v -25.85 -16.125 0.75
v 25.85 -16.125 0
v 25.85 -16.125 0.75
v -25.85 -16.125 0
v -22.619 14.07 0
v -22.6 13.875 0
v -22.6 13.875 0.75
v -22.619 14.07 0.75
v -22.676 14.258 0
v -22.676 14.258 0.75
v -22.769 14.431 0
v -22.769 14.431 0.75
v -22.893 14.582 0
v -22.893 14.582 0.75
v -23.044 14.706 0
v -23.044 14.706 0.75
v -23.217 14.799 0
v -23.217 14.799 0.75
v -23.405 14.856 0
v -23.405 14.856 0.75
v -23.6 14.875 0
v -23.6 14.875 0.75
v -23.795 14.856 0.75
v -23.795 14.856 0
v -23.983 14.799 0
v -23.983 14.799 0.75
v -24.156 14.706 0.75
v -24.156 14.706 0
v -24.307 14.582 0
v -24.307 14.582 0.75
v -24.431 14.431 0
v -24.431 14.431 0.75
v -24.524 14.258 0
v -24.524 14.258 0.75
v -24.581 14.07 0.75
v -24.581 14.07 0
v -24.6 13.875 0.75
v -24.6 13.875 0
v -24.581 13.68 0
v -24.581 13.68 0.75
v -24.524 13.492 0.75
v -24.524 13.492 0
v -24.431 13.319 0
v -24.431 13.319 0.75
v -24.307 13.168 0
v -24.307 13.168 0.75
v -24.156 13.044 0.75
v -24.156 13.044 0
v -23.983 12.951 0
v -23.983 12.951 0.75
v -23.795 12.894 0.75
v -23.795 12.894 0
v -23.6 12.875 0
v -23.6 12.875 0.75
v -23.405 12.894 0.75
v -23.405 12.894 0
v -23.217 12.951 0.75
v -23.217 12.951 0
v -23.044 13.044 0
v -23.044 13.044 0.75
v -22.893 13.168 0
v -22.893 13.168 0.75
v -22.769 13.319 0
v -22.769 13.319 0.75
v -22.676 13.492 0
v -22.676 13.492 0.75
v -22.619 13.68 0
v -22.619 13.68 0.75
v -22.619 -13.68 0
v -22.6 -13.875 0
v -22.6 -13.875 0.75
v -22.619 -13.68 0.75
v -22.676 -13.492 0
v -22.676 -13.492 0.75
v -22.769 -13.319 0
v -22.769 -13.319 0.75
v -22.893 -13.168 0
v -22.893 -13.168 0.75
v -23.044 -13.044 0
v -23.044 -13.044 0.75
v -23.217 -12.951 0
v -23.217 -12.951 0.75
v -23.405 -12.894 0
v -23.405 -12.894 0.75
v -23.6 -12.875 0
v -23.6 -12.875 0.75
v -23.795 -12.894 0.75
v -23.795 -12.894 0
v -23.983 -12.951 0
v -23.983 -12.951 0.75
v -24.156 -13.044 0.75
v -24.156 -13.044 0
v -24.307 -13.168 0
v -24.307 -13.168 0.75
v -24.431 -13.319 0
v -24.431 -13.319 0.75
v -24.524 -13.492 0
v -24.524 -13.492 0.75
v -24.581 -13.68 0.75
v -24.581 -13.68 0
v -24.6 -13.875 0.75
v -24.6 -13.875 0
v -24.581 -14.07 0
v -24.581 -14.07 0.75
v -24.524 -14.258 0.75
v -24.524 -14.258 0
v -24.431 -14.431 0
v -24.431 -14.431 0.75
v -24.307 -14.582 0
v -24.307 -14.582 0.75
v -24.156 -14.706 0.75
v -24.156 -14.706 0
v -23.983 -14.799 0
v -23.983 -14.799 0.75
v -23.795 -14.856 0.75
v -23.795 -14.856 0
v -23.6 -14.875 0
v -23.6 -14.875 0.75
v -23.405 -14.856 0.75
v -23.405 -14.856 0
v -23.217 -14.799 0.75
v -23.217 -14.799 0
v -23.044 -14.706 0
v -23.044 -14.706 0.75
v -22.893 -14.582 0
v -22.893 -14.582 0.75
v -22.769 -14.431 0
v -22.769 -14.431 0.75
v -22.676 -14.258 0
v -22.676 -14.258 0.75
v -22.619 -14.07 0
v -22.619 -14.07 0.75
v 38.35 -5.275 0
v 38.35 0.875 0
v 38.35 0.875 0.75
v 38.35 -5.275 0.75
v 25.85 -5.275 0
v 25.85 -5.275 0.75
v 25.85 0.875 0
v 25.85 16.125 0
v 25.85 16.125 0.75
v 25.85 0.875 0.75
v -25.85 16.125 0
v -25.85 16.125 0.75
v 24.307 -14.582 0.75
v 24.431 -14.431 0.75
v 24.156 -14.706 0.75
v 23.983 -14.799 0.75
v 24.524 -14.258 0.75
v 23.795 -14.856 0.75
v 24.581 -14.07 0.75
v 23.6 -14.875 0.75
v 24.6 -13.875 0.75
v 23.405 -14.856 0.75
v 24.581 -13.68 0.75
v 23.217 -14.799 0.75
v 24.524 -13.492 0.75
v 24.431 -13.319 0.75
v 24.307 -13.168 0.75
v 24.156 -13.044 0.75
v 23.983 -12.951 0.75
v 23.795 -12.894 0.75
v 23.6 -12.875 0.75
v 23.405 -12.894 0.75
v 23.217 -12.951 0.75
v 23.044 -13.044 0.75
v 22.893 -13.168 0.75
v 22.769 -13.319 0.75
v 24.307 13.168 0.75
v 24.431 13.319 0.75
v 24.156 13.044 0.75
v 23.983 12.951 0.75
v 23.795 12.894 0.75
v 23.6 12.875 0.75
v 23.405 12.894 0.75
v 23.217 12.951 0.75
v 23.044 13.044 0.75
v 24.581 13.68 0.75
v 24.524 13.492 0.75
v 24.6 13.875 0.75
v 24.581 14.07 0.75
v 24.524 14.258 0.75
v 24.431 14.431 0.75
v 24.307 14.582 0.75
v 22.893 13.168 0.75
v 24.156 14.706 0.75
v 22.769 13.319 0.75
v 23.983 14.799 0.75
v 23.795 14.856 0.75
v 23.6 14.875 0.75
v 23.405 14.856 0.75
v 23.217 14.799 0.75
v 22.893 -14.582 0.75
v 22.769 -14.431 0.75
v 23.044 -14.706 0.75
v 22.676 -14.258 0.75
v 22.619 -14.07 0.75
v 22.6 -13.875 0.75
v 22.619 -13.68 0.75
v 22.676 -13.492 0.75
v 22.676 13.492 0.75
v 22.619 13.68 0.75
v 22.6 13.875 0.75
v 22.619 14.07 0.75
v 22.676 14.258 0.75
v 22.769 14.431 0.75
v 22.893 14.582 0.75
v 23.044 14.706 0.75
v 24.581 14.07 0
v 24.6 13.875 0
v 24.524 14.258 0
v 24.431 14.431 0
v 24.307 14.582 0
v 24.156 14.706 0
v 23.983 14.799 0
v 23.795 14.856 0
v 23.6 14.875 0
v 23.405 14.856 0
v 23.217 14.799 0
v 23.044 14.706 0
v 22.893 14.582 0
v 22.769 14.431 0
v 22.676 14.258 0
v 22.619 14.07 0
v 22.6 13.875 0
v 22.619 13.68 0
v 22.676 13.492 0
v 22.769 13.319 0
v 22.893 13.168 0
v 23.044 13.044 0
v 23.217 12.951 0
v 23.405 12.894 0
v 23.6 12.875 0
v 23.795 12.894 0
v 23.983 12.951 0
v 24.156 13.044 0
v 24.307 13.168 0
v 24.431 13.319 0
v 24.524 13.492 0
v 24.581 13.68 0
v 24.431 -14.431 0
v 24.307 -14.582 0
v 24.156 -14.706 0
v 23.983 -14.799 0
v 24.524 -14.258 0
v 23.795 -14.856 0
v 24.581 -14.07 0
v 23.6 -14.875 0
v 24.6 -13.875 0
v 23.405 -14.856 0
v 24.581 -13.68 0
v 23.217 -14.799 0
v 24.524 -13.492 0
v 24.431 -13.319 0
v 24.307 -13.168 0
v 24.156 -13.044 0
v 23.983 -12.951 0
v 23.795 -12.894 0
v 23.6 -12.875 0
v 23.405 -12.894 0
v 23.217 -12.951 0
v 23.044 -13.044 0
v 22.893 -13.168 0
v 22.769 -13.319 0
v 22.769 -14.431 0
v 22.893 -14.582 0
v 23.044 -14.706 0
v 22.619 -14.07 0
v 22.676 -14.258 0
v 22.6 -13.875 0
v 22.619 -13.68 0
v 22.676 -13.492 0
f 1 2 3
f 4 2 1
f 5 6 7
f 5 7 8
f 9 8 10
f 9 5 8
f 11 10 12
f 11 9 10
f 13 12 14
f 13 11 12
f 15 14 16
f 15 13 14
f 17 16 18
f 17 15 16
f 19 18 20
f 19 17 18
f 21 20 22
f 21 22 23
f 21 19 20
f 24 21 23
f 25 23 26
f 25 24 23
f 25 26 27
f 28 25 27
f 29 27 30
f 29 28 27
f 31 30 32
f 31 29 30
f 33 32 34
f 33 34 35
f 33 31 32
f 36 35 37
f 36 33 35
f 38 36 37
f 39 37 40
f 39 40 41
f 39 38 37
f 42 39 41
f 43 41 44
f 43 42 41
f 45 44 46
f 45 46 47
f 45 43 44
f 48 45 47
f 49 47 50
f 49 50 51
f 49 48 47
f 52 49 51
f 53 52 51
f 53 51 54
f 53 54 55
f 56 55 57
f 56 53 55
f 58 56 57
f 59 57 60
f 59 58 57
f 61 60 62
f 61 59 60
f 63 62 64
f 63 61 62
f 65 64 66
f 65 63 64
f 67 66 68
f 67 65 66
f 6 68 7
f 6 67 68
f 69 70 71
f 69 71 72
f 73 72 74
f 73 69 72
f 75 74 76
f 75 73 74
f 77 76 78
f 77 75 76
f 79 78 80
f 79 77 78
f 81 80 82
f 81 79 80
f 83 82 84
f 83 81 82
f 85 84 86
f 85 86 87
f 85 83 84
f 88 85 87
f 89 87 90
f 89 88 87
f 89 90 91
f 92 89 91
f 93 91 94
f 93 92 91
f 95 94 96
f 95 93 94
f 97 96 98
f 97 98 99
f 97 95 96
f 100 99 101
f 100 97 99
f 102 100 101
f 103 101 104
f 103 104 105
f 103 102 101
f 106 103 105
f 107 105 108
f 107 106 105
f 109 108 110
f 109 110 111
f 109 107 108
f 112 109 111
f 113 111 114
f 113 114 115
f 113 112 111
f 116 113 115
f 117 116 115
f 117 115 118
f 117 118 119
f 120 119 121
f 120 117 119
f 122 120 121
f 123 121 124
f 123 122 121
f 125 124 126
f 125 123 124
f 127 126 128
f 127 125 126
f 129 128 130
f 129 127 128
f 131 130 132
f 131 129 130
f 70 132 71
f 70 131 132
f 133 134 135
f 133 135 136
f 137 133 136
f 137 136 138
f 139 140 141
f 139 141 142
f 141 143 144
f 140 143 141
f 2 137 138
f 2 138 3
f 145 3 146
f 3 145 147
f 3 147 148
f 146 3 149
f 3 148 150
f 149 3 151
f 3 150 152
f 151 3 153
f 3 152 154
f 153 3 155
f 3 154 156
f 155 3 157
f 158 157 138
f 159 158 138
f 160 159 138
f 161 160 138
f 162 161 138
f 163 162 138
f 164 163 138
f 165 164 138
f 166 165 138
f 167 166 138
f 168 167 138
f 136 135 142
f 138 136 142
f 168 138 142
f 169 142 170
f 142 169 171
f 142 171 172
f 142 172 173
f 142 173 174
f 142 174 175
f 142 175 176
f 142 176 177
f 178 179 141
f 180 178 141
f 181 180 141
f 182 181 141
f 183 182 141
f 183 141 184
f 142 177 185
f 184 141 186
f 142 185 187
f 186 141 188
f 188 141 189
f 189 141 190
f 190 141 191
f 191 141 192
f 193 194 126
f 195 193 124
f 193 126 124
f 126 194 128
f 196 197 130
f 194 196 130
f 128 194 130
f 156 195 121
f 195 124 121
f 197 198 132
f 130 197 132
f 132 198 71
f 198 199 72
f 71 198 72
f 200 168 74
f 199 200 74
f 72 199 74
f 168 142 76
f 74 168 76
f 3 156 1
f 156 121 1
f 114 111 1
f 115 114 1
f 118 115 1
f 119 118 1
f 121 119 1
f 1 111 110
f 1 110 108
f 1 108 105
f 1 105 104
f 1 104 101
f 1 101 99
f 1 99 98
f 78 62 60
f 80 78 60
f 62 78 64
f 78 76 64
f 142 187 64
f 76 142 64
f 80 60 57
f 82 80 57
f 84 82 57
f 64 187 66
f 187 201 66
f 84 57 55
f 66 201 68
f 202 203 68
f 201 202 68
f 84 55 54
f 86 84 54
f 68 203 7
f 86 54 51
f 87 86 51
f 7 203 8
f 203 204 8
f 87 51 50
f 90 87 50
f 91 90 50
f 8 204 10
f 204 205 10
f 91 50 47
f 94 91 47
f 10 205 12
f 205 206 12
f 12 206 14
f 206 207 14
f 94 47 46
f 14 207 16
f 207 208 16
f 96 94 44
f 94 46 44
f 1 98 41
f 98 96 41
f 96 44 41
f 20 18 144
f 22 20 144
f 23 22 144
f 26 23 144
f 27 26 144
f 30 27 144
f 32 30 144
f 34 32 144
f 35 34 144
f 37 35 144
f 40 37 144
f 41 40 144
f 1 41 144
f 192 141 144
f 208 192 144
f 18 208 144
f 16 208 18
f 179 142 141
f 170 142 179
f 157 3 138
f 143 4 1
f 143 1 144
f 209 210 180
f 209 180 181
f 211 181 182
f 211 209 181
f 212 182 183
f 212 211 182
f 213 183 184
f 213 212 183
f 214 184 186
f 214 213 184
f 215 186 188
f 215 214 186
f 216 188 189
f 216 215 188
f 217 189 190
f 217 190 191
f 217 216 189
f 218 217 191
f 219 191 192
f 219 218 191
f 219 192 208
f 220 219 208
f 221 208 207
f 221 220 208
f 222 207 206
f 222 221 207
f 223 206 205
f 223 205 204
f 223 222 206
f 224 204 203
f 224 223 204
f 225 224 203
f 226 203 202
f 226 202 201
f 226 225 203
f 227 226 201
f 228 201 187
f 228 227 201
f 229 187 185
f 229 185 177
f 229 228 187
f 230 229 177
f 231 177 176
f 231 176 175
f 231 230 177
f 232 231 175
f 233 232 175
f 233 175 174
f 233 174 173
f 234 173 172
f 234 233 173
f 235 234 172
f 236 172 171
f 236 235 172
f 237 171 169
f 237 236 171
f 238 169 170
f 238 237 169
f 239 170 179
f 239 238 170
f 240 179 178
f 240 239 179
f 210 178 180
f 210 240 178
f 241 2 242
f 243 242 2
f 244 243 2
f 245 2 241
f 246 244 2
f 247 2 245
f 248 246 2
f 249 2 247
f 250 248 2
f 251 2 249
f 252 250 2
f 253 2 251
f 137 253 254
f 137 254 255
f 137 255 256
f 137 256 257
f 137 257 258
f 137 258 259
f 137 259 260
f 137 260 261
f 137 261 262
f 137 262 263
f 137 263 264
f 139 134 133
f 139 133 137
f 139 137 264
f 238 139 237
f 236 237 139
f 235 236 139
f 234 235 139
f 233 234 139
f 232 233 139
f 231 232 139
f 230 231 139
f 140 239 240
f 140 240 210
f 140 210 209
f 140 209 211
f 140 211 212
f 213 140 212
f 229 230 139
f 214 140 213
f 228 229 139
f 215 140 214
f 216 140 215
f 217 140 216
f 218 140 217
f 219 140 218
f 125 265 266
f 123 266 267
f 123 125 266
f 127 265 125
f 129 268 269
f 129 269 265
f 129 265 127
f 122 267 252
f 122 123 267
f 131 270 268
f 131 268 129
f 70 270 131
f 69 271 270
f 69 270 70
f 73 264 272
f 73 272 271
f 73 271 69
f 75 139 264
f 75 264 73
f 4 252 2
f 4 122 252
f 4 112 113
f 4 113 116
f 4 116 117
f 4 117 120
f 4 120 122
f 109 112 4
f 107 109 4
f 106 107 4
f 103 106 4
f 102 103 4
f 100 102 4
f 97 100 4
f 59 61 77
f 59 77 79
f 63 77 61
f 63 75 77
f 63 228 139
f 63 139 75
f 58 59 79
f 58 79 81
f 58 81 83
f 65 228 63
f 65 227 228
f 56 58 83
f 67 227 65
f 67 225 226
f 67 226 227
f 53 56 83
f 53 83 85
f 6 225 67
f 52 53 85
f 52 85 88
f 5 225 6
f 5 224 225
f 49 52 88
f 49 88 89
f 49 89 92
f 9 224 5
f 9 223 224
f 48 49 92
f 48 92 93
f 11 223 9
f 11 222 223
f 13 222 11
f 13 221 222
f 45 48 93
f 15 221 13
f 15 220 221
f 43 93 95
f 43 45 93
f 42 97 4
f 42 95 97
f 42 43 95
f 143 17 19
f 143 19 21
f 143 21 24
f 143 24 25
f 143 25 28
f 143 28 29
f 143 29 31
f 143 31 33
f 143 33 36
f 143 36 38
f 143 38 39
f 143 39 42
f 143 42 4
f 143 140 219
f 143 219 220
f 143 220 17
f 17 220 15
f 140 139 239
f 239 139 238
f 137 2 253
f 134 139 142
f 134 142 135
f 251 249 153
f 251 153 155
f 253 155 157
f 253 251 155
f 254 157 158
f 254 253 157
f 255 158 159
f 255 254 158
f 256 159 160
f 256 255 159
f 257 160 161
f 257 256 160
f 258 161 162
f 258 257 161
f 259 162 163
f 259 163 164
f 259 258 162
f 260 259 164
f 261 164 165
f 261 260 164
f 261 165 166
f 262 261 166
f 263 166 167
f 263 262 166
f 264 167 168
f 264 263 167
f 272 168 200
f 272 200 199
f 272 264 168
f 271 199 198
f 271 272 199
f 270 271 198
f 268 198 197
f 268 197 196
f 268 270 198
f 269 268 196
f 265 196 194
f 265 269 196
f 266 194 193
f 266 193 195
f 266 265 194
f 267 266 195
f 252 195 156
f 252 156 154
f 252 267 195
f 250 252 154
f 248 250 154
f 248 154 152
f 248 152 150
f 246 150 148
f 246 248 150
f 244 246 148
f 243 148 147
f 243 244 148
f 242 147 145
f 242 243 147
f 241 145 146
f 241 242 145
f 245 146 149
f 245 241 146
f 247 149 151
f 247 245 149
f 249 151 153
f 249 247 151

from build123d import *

# Parameters (mm, degrees)
SKETCH_R  = 1
PAD_DEPTH = 0.75


with BuildPart() as part:
    # Sketch → Pad (new body)
    with BuildSketch(Plane.XY):
        Polygon((-25.85, 16.125), (25.85, 16.125), (25.85, 0.875), (38.35, 0.875), (38.35, -5.275), (25.85, -5.275), (25.85, -16.125), (-25.85, -16.125), align=None)
        with Locations((-23.6, 13.875)):
            Circle(SKETCH_R, mode=Mode.SUBTRACT)
        with Locations((23.6, -13.875)):
            Circle(SKETCH_R, mode=Mode.SUBTRACT)
        with Locations((23.6, 13.875)):
            Circle(SKETCH_R, mode=Mode.SUBTRACT)
        with Locations((-23.6, -13.875)):
            Circle(SKETCH_R, mode=Mode.SUBTRACT)
    extrude(amount=PAD_DEPTH)


solid = part.part
